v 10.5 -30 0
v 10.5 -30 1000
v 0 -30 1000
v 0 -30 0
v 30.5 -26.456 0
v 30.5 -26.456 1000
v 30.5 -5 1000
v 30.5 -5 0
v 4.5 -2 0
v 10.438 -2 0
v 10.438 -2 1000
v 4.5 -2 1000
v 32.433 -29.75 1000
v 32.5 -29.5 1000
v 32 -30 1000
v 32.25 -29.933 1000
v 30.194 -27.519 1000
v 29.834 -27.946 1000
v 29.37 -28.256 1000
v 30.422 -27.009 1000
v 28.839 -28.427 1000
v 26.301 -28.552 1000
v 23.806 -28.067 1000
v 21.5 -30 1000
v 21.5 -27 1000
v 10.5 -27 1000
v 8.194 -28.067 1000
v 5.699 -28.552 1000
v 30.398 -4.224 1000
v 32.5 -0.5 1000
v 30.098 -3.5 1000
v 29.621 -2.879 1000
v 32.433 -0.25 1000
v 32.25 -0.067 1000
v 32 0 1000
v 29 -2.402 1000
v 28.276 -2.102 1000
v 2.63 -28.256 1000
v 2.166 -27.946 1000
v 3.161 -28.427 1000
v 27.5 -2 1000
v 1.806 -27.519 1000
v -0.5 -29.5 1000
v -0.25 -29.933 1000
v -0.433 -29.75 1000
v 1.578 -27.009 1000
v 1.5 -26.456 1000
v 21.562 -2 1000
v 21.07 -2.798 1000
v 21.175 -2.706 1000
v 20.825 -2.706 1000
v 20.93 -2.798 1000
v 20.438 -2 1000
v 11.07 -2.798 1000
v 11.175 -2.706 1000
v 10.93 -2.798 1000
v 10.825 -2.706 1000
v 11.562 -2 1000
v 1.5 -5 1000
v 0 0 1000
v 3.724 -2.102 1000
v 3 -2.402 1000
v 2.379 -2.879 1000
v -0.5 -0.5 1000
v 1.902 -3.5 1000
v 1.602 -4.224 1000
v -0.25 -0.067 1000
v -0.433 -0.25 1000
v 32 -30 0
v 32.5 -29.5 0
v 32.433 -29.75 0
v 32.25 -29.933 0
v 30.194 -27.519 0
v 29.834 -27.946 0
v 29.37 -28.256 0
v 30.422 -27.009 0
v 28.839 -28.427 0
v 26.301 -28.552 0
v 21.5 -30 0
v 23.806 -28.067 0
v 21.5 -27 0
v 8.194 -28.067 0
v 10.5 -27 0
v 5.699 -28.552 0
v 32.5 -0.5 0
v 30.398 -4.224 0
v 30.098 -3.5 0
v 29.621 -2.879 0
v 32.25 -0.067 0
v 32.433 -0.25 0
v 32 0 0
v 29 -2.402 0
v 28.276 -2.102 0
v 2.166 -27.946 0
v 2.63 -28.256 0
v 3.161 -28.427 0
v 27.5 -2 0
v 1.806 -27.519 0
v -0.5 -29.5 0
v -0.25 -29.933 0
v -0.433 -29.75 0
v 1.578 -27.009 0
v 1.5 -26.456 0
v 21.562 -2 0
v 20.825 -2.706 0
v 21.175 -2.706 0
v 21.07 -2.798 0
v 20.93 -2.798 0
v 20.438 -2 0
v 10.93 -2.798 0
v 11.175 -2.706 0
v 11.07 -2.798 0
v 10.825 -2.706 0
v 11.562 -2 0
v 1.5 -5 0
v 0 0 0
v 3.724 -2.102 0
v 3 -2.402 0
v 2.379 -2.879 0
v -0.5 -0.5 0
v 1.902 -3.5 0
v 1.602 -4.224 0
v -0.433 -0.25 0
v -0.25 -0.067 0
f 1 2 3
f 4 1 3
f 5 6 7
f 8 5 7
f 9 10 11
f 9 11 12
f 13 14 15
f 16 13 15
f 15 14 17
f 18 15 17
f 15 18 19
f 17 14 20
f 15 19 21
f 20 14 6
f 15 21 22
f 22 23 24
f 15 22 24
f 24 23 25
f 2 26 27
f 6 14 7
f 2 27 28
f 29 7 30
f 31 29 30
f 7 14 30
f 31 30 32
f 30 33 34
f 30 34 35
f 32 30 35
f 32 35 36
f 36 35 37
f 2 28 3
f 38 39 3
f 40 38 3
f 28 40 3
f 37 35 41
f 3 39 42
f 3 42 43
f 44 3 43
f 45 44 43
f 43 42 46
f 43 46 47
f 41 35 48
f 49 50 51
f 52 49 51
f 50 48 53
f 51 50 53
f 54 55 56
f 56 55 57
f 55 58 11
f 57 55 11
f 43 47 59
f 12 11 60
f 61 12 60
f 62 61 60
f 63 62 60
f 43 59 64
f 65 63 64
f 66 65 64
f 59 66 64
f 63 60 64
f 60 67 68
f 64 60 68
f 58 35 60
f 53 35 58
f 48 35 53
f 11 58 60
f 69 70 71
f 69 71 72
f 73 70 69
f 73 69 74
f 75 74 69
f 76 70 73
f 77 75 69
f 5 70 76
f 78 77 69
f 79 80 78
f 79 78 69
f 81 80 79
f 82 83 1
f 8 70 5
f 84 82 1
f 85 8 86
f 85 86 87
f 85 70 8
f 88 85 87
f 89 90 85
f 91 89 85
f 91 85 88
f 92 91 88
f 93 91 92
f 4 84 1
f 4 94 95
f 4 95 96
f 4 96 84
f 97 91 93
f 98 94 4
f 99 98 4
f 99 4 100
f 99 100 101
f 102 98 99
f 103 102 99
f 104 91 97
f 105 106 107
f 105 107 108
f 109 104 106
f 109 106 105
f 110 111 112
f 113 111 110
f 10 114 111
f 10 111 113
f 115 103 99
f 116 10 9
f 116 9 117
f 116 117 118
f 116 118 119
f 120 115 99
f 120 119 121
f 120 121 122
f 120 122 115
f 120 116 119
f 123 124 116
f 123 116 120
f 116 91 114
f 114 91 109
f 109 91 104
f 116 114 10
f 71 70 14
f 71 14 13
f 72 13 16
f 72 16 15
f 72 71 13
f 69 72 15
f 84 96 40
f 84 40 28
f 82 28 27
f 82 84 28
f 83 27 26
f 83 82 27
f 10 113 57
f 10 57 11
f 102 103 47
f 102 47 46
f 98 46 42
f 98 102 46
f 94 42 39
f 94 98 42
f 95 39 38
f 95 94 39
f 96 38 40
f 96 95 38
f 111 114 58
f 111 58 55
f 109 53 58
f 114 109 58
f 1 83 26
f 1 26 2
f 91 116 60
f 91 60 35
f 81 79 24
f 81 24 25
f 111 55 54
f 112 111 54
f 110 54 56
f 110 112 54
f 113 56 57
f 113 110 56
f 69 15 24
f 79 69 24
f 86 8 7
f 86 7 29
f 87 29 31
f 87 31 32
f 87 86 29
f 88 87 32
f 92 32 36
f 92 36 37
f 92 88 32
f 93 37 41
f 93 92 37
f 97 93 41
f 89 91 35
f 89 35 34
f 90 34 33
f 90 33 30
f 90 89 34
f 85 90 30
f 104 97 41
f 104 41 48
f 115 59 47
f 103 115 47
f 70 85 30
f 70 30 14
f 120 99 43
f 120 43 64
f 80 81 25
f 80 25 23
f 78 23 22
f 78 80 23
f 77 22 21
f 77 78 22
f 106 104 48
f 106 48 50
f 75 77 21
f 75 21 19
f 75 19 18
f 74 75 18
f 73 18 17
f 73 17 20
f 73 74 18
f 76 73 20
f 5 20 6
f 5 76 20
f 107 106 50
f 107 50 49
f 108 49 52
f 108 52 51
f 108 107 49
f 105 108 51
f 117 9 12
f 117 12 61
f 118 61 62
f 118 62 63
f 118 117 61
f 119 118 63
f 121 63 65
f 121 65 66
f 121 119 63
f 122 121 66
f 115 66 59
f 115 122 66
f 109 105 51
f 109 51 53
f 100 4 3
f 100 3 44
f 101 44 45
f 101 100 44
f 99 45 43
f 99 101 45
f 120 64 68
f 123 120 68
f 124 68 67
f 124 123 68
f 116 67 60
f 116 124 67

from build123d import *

# Parameters (mm, degrees)
EXTRUDE_1_DEPTH = 1000


with BuildPart() as part:
    # 草图1 → 凸台-拉伸1 (new body)
    with BuildSketch(Plane.XY):
        with BuildLine():
            Line((10.5, -30), (0, -30))
            ThreePointArc((0, -30), (-0.353553391, -29.853553391), (-0.5, -29.5))
            Line((-0.5, -29.5), (-0.5, -0.5))
            ThreePointArc((-0.5, -0.5), (-0.353553391, -0.146446609), (0, 0))
            Line((0, 0), (32, 0))
            ThreePointArc((32, 0), (32.353553391, -0.146446609), (32.5, -0.5))
            Line((32.5, -0.5), (32.5, -29.5))
            ThreePointArc((32.5, -29.5), (32.353553391, -29.853553391), (32, -30))
            Line((32, -30), (21.5, -30))
            Line((21.5, -30), (21.5, -27))
            ThreePointArc((21.5, -27), (25.038664483, -28.385121551), (28.838528773, -28.426827781))
            ThreePointArc((28.838528773, -28.426827781), (30.029224893, -27.744667111), (30.5, -26.455686418))
            Line((30.5, -26.455686418), (30.5, -5))
            ThreePointArc((30.5, -5), (29.621320344, -2.878679656), (27.5, -2))
            Line((27.5, -2), (21.562207583, -2))
            Line((21.562207583, -2), (21.175427925, -2.706444665))
            ThreePointArc((21.175427925, -2.706444665), (21, -2.810397577), (20.824572075, -2.706444665))
            Line((20.824572075, -2.706444665), (20.437792417, -2))
            Line((20.437792417, -2), (11.562207583, -2))
            Line((11.562207583, -2), (11.175427925, -2.706444665))
            ThreePointArc((11.175427925, -2.706444665), (11, -2.810397577), (10.824572075, -2.706444665))
            Line((10.824572075, -2.706444665), (10.437792417, -2))
            Line((10.437792417, -2), (4.5, -2))
            ThreePointArc((4.5, -2), (2.378679656, -2.878679656), (1.5, -5))
            Line((1.5, -5), (1.5, -26.455686418))
            ThreePointArc((1.5, -26.455686418), (1.970775107, -27.744667111), (3.161471227, -28.426827781))
            ThreePointArc((3.161471227, -28.426827781), (6.961335517, -28.385121551), (10.5, -27))
            Line((10.5, -27), (10.5, -30))
        make_face()
    extrude(amount=EXTRUDE_1_DEPTH)


solid = part.part
